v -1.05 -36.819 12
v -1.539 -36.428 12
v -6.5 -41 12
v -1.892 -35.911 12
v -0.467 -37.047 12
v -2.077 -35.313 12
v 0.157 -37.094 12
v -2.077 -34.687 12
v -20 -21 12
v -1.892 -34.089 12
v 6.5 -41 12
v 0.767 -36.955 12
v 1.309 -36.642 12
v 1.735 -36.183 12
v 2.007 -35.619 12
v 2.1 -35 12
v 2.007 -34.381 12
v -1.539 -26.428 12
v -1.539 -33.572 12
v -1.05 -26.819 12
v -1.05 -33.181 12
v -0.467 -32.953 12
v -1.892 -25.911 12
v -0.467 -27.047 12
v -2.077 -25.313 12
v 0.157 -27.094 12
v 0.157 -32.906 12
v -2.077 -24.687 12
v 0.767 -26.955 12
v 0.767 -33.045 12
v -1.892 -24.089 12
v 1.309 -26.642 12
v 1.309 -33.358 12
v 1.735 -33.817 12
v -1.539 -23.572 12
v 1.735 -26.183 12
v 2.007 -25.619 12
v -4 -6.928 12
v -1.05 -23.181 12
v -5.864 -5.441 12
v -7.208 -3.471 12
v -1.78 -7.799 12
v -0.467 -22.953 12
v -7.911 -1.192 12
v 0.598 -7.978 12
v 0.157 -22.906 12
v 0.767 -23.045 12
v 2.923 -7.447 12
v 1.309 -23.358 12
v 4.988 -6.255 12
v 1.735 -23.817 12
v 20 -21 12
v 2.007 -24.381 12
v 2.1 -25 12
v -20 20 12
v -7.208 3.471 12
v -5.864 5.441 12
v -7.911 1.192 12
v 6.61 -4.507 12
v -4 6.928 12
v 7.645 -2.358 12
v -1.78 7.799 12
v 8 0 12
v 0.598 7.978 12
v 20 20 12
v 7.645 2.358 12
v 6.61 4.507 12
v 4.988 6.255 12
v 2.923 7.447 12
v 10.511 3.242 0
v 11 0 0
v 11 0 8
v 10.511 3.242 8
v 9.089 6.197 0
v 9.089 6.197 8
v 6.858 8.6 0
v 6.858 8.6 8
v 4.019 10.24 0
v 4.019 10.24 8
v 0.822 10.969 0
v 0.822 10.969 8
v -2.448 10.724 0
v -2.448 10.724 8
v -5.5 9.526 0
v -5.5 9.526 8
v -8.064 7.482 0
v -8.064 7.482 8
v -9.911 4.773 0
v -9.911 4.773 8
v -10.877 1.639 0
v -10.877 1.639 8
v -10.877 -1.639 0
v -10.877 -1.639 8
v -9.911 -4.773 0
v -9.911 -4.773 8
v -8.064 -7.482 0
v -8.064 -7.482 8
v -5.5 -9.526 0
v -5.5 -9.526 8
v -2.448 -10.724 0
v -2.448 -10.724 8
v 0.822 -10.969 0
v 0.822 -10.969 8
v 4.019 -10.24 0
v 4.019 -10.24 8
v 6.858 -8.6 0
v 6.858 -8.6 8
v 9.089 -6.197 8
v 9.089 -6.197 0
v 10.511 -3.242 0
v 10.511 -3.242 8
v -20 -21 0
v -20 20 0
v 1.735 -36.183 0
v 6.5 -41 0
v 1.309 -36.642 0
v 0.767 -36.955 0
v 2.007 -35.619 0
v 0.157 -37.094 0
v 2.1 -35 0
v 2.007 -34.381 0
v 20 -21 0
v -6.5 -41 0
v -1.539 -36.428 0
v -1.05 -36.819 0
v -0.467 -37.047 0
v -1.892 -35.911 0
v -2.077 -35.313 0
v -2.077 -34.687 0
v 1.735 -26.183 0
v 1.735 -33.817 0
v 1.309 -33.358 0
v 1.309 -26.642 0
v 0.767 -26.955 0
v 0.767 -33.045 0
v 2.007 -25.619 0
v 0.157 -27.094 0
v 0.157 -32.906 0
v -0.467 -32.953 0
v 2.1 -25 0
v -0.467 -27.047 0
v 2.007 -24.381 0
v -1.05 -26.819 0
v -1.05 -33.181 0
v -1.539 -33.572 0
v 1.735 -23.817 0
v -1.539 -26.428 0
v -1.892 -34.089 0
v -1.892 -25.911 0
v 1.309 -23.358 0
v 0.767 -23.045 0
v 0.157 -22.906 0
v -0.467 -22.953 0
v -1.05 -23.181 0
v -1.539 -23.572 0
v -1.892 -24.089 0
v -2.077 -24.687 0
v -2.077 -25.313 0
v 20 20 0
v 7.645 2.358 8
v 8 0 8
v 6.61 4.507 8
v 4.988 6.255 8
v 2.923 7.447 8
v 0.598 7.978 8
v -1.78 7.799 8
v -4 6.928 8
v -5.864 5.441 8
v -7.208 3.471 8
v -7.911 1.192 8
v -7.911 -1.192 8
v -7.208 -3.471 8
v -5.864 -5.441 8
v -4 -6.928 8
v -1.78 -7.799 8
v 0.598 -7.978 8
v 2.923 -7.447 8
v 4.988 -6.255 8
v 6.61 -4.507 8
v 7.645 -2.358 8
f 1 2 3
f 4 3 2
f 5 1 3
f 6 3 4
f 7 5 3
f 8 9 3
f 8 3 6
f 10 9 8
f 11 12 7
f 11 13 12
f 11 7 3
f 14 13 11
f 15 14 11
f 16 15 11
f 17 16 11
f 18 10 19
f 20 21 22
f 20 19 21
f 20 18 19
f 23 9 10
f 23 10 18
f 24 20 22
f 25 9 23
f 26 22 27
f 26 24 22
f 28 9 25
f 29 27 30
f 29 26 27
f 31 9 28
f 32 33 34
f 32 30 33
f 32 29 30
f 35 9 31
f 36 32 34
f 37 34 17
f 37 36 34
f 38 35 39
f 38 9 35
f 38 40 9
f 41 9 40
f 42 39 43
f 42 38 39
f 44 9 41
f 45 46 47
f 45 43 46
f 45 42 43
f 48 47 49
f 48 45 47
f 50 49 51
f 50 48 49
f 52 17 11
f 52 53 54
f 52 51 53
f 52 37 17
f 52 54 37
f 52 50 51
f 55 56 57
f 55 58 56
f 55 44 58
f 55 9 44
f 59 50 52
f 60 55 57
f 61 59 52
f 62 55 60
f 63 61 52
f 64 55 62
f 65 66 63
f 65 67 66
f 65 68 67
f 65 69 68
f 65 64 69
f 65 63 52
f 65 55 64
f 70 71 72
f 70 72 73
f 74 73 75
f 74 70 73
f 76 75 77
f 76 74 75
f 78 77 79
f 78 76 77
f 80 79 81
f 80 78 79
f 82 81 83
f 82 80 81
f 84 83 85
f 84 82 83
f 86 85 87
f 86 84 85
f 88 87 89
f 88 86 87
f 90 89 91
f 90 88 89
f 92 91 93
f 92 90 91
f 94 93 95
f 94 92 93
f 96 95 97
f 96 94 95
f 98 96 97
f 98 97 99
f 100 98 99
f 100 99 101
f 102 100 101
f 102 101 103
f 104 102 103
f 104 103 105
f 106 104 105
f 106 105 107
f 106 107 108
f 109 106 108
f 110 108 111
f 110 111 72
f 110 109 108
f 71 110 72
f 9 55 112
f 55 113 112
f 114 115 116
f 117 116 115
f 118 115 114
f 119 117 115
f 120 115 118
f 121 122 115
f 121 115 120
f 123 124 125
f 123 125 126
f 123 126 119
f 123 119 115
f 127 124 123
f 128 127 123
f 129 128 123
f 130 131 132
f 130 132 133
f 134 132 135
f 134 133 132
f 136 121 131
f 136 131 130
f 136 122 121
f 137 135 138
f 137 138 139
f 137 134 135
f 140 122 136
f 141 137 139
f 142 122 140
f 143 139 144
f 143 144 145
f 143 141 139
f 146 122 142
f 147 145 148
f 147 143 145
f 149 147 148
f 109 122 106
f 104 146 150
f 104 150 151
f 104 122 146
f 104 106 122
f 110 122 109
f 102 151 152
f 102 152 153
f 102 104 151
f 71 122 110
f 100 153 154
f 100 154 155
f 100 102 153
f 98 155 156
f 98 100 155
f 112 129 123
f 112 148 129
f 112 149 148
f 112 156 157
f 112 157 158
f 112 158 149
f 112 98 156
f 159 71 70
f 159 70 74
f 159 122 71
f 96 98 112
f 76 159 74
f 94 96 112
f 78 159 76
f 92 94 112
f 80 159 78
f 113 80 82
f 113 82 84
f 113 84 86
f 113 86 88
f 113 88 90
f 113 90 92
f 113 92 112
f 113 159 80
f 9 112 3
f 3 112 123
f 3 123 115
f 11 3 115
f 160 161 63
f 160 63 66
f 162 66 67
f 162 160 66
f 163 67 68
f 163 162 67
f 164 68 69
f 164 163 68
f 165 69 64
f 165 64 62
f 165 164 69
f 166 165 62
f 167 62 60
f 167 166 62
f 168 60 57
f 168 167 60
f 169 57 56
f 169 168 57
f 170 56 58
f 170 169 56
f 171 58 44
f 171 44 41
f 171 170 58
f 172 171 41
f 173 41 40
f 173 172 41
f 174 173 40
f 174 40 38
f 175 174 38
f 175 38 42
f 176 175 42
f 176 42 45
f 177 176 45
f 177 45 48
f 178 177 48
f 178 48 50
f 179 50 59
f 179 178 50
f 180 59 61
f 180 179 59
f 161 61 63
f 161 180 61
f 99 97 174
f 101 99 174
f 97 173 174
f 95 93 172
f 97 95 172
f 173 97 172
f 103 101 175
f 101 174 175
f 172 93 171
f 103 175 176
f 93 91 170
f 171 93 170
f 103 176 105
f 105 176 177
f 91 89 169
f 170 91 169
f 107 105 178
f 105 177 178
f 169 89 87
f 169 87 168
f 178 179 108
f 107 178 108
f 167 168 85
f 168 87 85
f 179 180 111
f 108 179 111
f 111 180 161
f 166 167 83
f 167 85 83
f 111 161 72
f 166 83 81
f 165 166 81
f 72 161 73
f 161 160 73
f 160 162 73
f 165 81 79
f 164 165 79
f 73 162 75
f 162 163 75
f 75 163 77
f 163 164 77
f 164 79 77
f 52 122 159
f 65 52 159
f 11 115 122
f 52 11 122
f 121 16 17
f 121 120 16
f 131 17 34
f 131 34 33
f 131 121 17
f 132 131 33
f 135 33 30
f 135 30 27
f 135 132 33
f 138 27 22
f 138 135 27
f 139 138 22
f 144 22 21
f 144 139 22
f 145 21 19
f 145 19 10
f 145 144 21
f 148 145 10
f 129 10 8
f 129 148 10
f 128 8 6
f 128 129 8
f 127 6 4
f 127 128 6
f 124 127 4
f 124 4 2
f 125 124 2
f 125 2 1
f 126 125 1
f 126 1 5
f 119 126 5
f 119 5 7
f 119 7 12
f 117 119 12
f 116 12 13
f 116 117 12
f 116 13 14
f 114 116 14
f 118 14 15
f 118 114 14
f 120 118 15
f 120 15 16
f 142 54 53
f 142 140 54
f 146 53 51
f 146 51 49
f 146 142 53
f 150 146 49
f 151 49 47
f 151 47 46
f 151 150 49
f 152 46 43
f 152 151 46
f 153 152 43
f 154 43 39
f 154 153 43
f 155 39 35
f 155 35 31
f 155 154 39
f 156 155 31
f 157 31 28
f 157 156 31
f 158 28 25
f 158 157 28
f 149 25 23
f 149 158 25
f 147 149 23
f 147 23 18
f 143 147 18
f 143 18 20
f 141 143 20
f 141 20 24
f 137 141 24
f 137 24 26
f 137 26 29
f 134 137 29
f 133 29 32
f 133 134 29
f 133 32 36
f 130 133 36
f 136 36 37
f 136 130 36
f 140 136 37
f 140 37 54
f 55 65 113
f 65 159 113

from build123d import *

# Parameters (mm, degrees)
SKETCH1_R           = 11
SKETCH1_R_2         = 2.1
BOSS_EXTRUDE1_DEPTH = 8
SKETCH2_R           = 8
SKETCH2_R_2         = 2.1
BOSS_EXTRUDE2_DEPTH = 4


with BuildPart() as part:
    # Sketch1 → Boss-Extrude1 (new body)
    with BuildSketch(Plane.XY):
        Polygon((-20, 20), (20, 20), (20, -21), (6.5, -41), (-6.5, -41), (-20, -21), align=None)
        Circle(SKETCH1_R, mode=Mode.SUBTRACT)
        with Locations((0, -35)):
            Circle(SKETCH1_R_2, mode=Mode.SUBTRACT)
        with Locations((0, -25)):
            Circle(SKETCH1_R_2, mode=Mode.SUBTRACT)
    extrude(amount=BOSS_EXTRUDE1_DEPTH)

    # Sketch2 → Boss-Extrude2 (add)
    with BuildSketch(Plane.XY.offset(8)):
        Polygon((20, -21), (20, 20), (-20, 20), (-20, -21), (-6.5, -41), (6.5, -41), align=None)
        Circle(SKETCH2_R, mode=Mode.SUBTRACT)
        with Locations((0, -35)):
            Circle(SKETCH2_R_2, mode=Mode.SUBTRACT)
        with Locations((0, -25)):
            Circle(SKETCH2_R_2, mode=Mode.SUBTRACT)
    extrude(amount=BOSS_EXTRUDE2_DEPTH)


solid = part.part
